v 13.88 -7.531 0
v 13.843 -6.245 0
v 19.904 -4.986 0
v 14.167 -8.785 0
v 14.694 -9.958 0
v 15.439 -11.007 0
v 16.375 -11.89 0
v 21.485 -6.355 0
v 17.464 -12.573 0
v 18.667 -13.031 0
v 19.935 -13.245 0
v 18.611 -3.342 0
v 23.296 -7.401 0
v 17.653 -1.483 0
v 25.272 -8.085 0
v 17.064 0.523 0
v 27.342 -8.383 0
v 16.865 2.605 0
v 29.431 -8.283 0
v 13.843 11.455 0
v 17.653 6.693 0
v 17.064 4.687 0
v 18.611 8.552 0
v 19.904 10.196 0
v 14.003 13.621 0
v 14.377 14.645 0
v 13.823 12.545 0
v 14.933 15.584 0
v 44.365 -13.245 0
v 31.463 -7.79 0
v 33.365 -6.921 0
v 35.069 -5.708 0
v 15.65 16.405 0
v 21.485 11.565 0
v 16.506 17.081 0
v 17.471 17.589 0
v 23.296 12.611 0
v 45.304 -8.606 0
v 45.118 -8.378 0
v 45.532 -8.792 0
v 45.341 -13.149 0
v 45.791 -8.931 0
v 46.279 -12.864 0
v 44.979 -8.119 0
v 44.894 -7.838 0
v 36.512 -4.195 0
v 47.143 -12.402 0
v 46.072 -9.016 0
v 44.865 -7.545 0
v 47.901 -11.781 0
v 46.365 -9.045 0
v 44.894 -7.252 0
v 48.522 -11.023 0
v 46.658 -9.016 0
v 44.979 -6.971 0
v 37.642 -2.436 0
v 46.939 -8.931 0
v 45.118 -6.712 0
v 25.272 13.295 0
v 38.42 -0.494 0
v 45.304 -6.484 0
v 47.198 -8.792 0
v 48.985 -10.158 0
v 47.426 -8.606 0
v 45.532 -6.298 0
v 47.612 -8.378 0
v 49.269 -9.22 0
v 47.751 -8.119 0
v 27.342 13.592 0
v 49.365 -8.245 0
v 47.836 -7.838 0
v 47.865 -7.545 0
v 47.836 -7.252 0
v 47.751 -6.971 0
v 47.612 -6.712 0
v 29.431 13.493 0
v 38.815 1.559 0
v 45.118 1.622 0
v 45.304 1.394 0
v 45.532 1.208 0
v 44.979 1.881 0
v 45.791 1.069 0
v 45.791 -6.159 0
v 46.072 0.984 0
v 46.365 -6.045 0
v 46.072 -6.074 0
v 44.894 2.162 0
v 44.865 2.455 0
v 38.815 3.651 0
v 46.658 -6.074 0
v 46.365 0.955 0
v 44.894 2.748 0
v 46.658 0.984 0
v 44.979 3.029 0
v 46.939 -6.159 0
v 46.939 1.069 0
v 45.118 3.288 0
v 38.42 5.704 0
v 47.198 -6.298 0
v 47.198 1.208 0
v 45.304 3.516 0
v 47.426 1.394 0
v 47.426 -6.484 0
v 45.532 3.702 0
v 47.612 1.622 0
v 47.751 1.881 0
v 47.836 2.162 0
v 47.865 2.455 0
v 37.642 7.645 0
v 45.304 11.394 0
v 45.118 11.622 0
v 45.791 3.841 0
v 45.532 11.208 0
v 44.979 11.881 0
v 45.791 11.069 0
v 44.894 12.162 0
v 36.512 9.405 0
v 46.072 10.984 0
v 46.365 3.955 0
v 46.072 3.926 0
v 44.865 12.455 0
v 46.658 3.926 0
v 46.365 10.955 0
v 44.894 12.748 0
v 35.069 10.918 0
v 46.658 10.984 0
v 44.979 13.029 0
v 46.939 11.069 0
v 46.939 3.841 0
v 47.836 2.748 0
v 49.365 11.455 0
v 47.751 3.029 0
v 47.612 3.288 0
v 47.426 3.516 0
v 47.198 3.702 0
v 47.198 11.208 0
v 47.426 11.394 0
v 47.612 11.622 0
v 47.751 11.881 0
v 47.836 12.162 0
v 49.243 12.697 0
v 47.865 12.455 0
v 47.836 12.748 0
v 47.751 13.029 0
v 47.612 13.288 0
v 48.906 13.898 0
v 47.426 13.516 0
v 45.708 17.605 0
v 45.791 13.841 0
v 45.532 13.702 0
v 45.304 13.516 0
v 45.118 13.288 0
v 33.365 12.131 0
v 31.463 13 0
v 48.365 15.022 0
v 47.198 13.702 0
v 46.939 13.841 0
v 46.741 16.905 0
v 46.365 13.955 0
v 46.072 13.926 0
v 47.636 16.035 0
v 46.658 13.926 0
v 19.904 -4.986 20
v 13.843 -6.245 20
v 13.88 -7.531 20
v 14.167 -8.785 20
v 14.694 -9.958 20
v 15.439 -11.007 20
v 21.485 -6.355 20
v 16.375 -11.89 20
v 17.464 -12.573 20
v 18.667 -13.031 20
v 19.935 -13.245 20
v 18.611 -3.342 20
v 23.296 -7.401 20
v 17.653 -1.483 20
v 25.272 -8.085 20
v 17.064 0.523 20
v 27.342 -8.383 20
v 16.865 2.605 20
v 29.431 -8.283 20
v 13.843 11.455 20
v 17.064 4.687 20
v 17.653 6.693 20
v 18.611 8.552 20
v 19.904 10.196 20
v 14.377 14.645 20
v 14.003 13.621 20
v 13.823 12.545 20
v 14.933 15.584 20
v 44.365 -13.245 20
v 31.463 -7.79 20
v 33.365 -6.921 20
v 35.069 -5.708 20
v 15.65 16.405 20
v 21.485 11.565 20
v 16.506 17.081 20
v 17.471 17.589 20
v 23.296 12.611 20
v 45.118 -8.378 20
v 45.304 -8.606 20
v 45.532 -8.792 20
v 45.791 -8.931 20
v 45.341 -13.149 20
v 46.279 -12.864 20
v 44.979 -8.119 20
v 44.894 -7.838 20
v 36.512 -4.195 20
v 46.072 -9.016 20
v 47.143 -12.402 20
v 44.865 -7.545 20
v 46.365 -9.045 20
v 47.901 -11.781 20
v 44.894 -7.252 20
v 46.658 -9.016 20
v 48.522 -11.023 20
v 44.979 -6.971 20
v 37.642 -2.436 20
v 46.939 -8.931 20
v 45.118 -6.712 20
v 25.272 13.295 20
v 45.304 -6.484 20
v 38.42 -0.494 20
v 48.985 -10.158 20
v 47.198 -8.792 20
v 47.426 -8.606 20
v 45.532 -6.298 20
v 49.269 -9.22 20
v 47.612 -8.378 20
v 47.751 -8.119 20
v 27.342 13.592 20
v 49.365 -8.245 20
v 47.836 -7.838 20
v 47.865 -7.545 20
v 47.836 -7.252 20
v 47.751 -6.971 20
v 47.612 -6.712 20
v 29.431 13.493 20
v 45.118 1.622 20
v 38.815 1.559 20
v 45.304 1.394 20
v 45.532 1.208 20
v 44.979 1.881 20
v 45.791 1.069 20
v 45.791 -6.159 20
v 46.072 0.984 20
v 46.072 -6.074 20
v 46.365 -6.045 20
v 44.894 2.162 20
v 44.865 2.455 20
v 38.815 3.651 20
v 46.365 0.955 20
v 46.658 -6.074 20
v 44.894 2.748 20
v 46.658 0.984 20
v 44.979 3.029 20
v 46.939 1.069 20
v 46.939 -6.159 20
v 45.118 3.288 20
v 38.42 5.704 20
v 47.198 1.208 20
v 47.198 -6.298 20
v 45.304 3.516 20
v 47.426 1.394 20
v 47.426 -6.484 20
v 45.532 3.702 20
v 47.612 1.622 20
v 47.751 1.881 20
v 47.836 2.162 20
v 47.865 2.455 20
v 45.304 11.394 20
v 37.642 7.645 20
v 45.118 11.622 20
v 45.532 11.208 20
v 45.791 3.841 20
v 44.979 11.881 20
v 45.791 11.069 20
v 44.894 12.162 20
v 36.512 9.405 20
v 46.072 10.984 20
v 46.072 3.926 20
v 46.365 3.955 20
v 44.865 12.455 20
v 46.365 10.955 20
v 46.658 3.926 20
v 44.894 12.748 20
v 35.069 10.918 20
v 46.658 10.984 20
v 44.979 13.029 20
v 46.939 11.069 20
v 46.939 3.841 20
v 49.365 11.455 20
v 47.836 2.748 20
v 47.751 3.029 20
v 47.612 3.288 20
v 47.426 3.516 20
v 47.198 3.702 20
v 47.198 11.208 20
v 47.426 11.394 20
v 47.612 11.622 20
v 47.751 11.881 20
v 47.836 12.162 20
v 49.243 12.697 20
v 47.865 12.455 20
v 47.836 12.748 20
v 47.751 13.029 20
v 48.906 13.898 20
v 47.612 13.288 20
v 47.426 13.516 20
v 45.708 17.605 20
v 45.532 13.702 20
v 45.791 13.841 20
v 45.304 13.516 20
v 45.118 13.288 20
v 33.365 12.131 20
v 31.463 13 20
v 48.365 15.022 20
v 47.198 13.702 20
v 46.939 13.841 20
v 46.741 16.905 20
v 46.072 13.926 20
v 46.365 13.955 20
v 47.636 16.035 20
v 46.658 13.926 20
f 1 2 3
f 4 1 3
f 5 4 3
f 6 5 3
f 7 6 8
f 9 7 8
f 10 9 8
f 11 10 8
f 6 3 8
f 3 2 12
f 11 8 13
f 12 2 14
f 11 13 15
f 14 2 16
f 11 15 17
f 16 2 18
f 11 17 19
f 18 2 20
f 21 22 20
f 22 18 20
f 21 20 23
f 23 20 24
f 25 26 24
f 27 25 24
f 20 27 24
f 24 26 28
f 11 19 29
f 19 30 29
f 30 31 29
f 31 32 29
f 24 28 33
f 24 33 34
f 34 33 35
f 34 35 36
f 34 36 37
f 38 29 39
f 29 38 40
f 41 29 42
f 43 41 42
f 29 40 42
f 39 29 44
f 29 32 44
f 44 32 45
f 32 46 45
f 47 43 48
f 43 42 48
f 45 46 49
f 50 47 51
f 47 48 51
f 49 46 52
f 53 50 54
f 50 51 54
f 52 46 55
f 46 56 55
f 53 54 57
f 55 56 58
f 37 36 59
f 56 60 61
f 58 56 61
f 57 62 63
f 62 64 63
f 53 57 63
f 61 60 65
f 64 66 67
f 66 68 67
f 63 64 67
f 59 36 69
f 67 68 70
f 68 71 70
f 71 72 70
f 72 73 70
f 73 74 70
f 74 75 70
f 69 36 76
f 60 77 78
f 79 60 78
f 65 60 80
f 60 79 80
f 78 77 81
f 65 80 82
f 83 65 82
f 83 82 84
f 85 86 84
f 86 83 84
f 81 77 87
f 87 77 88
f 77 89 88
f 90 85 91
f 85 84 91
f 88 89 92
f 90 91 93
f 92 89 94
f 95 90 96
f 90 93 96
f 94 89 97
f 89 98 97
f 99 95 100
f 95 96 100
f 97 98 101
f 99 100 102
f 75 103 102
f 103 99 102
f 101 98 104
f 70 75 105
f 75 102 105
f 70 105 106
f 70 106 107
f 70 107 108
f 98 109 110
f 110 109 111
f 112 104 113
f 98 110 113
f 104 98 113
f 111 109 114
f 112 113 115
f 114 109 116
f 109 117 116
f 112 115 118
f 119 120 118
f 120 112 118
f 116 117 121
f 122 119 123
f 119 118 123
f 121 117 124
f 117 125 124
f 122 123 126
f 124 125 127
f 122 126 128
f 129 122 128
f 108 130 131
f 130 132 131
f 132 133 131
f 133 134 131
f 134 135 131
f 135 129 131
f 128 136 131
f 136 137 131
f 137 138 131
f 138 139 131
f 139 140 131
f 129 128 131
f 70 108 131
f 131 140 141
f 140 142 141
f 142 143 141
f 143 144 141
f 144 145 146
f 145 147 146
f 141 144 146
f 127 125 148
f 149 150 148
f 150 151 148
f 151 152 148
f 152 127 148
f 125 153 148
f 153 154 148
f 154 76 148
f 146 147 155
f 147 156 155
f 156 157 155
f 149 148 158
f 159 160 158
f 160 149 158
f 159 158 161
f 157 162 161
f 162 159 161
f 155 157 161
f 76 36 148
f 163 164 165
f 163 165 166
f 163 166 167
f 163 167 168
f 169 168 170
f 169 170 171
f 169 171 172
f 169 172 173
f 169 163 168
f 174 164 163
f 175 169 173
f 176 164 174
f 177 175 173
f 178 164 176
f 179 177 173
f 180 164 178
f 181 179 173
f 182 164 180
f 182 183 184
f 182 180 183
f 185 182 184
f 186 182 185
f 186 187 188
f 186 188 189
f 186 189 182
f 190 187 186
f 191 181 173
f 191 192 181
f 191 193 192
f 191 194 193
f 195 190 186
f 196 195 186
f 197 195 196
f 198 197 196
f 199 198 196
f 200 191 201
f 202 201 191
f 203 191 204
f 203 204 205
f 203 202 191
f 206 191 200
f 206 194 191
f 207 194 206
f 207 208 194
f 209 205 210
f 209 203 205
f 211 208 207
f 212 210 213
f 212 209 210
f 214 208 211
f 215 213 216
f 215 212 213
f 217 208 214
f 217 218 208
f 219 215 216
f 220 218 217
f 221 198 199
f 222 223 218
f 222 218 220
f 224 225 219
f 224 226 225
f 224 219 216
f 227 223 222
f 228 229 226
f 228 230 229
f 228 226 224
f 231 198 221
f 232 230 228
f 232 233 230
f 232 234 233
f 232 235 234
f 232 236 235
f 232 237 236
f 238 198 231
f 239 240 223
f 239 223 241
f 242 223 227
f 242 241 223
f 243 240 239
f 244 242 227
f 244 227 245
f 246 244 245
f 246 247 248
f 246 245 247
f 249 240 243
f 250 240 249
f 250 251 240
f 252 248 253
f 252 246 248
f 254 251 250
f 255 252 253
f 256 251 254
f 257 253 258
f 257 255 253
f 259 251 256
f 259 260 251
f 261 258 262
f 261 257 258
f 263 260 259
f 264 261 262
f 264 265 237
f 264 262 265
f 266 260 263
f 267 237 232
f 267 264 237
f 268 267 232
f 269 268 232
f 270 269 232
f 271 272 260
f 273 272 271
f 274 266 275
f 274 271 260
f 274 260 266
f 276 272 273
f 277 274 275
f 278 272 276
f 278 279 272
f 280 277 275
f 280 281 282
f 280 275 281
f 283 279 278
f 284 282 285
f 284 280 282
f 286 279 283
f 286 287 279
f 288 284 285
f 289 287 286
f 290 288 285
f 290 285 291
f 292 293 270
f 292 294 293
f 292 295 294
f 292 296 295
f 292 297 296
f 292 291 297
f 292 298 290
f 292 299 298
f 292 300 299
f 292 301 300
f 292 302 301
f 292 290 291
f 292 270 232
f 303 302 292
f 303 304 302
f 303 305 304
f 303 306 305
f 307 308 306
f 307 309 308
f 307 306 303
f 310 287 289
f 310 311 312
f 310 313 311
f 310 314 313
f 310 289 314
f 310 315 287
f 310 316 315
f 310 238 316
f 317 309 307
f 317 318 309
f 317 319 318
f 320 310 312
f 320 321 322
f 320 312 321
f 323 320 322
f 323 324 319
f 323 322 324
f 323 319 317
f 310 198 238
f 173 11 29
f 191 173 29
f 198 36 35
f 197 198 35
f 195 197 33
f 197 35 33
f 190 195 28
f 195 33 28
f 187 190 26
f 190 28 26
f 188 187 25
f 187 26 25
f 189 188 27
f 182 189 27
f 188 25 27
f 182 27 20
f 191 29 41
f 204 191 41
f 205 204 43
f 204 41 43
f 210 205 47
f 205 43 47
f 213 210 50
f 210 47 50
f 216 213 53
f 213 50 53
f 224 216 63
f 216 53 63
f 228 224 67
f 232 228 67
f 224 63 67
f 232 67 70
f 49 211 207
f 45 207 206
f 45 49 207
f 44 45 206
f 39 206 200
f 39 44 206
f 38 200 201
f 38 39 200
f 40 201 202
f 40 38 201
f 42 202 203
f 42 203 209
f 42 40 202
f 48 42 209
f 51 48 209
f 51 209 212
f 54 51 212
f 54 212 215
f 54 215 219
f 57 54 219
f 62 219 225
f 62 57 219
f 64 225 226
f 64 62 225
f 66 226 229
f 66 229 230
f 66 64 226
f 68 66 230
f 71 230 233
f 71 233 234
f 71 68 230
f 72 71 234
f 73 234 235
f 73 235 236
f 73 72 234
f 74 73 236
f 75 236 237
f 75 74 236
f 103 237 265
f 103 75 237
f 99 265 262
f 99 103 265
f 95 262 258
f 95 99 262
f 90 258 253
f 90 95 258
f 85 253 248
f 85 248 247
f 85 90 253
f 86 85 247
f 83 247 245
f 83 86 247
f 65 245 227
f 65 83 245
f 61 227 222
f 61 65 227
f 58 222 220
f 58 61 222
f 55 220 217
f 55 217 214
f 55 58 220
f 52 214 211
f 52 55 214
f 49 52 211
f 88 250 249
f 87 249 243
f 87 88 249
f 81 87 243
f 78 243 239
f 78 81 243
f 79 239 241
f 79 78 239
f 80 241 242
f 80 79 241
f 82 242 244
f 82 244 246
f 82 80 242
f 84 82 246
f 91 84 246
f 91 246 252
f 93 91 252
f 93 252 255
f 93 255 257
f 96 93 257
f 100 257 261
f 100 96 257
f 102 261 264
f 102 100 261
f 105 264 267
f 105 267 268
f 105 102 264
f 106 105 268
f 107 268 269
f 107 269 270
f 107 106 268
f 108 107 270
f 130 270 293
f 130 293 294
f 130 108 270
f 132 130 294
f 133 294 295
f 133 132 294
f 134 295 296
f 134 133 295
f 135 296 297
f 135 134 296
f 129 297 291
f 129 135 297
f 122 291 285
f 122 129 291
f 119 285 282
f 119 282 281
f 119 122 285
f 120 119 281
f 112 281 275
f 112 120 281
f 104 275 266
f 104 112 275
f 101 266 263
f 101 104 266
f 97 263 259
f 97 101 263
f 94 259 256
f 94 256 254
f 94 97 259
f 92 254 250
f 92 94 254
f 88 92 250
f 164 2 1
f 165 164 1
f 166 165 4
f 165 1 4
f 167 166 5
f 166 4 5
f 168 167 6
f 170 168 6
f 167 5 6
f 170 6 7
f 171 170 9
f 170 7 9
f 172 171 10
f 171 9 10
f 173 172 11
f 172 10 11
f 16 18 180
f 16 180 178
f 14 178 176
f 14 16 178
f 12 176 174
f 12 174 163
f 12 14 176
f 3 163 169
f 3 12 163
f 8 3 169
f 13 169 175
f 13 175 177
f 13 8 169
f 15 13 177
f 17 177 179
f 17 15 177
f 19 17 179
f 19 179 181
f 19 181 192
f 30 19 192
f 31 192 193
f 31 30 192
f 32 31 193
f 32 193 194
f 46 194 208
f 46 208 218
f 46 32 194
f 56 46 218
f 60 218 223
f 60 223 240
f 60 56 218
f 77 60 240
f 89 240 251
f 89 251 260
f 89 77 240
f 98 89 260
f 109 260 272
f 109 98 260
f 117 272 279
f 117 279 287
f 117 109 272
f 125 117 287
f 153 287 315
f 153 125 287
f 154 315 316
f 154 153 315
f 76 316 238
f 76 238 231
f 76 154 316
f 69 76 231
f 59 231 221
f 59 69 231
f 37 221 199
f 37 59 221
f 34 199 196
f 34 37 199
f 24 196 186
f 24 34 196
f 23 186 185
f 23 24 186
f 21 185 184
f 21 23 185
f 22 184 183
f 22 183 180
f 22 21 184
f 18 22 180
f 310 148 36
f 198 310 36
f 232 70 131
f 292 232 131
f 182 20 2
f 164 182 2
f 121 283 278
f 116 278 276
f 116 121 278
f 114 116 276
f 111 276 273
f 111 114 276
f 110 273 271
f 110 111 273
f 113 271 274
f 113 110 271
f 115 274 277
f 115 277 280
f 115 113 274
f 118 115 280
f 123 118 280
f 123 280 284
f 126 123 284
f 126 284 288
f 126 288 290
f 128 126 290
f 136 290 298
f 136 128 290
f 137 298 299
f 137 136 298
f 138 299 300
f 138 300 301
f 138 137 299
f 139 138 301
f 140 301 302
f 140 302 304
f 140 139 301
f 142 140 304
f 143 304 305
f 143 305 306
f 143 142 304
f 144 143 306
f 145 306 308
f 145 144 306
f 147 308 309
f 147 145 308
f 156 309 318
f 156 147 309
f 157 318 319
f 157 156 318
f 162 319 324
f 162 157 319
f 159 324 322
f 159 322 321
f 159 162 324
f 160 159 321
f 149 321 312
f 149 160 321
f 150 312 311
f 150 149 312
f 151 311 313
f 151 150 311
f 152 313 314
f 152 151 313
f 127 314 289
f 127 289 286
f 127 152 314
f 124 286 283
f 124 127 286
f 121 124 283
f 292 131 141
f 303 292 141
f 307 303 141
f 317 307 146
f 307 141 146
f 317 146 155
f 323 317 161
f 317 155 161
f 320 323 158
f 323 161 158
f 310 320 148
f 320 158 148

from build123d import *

# Parameters (mm, degrees)
CROQUIS1_R              = 11
CROQUIS1_R_2            = 1.5
SALIENTE_EXTRUIR1_DEPTH = 20


with BuildPart() as part:
    # Croquis1 → Saliente-Extruir1 (new body)
    with BuildSketch(Plane.XY):
        with BuildLine():
            Line((19.934911271, -13.245043478), (44.365127053, -13.245043478))
            ThreePointArc((44.365127053, -13.245043478), (47.900660959, -11.780577384), (49.365127053, -8.245043478))
            Line((49.365127053, -8.245043478), (49.365127053, 11.454956522))
            ThreePointArc((49.365127053, 11.454956522), (48.364801216, 15.022297578), (45.708403889, 17.604956522))
            Line((45.708403889, 17.604956522), (17.470852565, 17.589387044))
            ThreePointArc((17.470852565, 17.589387044), (14.633403866, 15.127424661), (13.842612072, 11.454956522))
            Line((13.842612072, 11.454956522), (13.842612072, -6.245043478))
            ThreePointArc((13.842612072, -6.245043478), (15.439014203, -11.006799955), (19.934911271, -13.245043478))
        make_face()
        with Locations(Location((27.865127053, 2.604956522, 0), (0, 0, 180))):
            Circle(CROQUIS1_R, mode=Mode.SUBTRACT)
        with Locations(Location((46.365127053, 2.454956522, 0), (0, 0, 180))):
            Circle(CROQUIS1_R_2, mode=Mode.SUBTRACT)
        with Locations(Location((46.365127053, 12.454956522, 0), (0, 0, 180))):
            Circle(CROQUIS1_R_2, mode=Mode.SUBTRACT)
        with Locations(Location((46.365127053, -7.545043478, 0), (0, 0, 180))):
            Circle(CROQUIS1_R_2, mode=Mode.SUBTRACT)
    extrude(amount=SALIENTE_EXTRUIR1_DEPTH)


solid = part.part
